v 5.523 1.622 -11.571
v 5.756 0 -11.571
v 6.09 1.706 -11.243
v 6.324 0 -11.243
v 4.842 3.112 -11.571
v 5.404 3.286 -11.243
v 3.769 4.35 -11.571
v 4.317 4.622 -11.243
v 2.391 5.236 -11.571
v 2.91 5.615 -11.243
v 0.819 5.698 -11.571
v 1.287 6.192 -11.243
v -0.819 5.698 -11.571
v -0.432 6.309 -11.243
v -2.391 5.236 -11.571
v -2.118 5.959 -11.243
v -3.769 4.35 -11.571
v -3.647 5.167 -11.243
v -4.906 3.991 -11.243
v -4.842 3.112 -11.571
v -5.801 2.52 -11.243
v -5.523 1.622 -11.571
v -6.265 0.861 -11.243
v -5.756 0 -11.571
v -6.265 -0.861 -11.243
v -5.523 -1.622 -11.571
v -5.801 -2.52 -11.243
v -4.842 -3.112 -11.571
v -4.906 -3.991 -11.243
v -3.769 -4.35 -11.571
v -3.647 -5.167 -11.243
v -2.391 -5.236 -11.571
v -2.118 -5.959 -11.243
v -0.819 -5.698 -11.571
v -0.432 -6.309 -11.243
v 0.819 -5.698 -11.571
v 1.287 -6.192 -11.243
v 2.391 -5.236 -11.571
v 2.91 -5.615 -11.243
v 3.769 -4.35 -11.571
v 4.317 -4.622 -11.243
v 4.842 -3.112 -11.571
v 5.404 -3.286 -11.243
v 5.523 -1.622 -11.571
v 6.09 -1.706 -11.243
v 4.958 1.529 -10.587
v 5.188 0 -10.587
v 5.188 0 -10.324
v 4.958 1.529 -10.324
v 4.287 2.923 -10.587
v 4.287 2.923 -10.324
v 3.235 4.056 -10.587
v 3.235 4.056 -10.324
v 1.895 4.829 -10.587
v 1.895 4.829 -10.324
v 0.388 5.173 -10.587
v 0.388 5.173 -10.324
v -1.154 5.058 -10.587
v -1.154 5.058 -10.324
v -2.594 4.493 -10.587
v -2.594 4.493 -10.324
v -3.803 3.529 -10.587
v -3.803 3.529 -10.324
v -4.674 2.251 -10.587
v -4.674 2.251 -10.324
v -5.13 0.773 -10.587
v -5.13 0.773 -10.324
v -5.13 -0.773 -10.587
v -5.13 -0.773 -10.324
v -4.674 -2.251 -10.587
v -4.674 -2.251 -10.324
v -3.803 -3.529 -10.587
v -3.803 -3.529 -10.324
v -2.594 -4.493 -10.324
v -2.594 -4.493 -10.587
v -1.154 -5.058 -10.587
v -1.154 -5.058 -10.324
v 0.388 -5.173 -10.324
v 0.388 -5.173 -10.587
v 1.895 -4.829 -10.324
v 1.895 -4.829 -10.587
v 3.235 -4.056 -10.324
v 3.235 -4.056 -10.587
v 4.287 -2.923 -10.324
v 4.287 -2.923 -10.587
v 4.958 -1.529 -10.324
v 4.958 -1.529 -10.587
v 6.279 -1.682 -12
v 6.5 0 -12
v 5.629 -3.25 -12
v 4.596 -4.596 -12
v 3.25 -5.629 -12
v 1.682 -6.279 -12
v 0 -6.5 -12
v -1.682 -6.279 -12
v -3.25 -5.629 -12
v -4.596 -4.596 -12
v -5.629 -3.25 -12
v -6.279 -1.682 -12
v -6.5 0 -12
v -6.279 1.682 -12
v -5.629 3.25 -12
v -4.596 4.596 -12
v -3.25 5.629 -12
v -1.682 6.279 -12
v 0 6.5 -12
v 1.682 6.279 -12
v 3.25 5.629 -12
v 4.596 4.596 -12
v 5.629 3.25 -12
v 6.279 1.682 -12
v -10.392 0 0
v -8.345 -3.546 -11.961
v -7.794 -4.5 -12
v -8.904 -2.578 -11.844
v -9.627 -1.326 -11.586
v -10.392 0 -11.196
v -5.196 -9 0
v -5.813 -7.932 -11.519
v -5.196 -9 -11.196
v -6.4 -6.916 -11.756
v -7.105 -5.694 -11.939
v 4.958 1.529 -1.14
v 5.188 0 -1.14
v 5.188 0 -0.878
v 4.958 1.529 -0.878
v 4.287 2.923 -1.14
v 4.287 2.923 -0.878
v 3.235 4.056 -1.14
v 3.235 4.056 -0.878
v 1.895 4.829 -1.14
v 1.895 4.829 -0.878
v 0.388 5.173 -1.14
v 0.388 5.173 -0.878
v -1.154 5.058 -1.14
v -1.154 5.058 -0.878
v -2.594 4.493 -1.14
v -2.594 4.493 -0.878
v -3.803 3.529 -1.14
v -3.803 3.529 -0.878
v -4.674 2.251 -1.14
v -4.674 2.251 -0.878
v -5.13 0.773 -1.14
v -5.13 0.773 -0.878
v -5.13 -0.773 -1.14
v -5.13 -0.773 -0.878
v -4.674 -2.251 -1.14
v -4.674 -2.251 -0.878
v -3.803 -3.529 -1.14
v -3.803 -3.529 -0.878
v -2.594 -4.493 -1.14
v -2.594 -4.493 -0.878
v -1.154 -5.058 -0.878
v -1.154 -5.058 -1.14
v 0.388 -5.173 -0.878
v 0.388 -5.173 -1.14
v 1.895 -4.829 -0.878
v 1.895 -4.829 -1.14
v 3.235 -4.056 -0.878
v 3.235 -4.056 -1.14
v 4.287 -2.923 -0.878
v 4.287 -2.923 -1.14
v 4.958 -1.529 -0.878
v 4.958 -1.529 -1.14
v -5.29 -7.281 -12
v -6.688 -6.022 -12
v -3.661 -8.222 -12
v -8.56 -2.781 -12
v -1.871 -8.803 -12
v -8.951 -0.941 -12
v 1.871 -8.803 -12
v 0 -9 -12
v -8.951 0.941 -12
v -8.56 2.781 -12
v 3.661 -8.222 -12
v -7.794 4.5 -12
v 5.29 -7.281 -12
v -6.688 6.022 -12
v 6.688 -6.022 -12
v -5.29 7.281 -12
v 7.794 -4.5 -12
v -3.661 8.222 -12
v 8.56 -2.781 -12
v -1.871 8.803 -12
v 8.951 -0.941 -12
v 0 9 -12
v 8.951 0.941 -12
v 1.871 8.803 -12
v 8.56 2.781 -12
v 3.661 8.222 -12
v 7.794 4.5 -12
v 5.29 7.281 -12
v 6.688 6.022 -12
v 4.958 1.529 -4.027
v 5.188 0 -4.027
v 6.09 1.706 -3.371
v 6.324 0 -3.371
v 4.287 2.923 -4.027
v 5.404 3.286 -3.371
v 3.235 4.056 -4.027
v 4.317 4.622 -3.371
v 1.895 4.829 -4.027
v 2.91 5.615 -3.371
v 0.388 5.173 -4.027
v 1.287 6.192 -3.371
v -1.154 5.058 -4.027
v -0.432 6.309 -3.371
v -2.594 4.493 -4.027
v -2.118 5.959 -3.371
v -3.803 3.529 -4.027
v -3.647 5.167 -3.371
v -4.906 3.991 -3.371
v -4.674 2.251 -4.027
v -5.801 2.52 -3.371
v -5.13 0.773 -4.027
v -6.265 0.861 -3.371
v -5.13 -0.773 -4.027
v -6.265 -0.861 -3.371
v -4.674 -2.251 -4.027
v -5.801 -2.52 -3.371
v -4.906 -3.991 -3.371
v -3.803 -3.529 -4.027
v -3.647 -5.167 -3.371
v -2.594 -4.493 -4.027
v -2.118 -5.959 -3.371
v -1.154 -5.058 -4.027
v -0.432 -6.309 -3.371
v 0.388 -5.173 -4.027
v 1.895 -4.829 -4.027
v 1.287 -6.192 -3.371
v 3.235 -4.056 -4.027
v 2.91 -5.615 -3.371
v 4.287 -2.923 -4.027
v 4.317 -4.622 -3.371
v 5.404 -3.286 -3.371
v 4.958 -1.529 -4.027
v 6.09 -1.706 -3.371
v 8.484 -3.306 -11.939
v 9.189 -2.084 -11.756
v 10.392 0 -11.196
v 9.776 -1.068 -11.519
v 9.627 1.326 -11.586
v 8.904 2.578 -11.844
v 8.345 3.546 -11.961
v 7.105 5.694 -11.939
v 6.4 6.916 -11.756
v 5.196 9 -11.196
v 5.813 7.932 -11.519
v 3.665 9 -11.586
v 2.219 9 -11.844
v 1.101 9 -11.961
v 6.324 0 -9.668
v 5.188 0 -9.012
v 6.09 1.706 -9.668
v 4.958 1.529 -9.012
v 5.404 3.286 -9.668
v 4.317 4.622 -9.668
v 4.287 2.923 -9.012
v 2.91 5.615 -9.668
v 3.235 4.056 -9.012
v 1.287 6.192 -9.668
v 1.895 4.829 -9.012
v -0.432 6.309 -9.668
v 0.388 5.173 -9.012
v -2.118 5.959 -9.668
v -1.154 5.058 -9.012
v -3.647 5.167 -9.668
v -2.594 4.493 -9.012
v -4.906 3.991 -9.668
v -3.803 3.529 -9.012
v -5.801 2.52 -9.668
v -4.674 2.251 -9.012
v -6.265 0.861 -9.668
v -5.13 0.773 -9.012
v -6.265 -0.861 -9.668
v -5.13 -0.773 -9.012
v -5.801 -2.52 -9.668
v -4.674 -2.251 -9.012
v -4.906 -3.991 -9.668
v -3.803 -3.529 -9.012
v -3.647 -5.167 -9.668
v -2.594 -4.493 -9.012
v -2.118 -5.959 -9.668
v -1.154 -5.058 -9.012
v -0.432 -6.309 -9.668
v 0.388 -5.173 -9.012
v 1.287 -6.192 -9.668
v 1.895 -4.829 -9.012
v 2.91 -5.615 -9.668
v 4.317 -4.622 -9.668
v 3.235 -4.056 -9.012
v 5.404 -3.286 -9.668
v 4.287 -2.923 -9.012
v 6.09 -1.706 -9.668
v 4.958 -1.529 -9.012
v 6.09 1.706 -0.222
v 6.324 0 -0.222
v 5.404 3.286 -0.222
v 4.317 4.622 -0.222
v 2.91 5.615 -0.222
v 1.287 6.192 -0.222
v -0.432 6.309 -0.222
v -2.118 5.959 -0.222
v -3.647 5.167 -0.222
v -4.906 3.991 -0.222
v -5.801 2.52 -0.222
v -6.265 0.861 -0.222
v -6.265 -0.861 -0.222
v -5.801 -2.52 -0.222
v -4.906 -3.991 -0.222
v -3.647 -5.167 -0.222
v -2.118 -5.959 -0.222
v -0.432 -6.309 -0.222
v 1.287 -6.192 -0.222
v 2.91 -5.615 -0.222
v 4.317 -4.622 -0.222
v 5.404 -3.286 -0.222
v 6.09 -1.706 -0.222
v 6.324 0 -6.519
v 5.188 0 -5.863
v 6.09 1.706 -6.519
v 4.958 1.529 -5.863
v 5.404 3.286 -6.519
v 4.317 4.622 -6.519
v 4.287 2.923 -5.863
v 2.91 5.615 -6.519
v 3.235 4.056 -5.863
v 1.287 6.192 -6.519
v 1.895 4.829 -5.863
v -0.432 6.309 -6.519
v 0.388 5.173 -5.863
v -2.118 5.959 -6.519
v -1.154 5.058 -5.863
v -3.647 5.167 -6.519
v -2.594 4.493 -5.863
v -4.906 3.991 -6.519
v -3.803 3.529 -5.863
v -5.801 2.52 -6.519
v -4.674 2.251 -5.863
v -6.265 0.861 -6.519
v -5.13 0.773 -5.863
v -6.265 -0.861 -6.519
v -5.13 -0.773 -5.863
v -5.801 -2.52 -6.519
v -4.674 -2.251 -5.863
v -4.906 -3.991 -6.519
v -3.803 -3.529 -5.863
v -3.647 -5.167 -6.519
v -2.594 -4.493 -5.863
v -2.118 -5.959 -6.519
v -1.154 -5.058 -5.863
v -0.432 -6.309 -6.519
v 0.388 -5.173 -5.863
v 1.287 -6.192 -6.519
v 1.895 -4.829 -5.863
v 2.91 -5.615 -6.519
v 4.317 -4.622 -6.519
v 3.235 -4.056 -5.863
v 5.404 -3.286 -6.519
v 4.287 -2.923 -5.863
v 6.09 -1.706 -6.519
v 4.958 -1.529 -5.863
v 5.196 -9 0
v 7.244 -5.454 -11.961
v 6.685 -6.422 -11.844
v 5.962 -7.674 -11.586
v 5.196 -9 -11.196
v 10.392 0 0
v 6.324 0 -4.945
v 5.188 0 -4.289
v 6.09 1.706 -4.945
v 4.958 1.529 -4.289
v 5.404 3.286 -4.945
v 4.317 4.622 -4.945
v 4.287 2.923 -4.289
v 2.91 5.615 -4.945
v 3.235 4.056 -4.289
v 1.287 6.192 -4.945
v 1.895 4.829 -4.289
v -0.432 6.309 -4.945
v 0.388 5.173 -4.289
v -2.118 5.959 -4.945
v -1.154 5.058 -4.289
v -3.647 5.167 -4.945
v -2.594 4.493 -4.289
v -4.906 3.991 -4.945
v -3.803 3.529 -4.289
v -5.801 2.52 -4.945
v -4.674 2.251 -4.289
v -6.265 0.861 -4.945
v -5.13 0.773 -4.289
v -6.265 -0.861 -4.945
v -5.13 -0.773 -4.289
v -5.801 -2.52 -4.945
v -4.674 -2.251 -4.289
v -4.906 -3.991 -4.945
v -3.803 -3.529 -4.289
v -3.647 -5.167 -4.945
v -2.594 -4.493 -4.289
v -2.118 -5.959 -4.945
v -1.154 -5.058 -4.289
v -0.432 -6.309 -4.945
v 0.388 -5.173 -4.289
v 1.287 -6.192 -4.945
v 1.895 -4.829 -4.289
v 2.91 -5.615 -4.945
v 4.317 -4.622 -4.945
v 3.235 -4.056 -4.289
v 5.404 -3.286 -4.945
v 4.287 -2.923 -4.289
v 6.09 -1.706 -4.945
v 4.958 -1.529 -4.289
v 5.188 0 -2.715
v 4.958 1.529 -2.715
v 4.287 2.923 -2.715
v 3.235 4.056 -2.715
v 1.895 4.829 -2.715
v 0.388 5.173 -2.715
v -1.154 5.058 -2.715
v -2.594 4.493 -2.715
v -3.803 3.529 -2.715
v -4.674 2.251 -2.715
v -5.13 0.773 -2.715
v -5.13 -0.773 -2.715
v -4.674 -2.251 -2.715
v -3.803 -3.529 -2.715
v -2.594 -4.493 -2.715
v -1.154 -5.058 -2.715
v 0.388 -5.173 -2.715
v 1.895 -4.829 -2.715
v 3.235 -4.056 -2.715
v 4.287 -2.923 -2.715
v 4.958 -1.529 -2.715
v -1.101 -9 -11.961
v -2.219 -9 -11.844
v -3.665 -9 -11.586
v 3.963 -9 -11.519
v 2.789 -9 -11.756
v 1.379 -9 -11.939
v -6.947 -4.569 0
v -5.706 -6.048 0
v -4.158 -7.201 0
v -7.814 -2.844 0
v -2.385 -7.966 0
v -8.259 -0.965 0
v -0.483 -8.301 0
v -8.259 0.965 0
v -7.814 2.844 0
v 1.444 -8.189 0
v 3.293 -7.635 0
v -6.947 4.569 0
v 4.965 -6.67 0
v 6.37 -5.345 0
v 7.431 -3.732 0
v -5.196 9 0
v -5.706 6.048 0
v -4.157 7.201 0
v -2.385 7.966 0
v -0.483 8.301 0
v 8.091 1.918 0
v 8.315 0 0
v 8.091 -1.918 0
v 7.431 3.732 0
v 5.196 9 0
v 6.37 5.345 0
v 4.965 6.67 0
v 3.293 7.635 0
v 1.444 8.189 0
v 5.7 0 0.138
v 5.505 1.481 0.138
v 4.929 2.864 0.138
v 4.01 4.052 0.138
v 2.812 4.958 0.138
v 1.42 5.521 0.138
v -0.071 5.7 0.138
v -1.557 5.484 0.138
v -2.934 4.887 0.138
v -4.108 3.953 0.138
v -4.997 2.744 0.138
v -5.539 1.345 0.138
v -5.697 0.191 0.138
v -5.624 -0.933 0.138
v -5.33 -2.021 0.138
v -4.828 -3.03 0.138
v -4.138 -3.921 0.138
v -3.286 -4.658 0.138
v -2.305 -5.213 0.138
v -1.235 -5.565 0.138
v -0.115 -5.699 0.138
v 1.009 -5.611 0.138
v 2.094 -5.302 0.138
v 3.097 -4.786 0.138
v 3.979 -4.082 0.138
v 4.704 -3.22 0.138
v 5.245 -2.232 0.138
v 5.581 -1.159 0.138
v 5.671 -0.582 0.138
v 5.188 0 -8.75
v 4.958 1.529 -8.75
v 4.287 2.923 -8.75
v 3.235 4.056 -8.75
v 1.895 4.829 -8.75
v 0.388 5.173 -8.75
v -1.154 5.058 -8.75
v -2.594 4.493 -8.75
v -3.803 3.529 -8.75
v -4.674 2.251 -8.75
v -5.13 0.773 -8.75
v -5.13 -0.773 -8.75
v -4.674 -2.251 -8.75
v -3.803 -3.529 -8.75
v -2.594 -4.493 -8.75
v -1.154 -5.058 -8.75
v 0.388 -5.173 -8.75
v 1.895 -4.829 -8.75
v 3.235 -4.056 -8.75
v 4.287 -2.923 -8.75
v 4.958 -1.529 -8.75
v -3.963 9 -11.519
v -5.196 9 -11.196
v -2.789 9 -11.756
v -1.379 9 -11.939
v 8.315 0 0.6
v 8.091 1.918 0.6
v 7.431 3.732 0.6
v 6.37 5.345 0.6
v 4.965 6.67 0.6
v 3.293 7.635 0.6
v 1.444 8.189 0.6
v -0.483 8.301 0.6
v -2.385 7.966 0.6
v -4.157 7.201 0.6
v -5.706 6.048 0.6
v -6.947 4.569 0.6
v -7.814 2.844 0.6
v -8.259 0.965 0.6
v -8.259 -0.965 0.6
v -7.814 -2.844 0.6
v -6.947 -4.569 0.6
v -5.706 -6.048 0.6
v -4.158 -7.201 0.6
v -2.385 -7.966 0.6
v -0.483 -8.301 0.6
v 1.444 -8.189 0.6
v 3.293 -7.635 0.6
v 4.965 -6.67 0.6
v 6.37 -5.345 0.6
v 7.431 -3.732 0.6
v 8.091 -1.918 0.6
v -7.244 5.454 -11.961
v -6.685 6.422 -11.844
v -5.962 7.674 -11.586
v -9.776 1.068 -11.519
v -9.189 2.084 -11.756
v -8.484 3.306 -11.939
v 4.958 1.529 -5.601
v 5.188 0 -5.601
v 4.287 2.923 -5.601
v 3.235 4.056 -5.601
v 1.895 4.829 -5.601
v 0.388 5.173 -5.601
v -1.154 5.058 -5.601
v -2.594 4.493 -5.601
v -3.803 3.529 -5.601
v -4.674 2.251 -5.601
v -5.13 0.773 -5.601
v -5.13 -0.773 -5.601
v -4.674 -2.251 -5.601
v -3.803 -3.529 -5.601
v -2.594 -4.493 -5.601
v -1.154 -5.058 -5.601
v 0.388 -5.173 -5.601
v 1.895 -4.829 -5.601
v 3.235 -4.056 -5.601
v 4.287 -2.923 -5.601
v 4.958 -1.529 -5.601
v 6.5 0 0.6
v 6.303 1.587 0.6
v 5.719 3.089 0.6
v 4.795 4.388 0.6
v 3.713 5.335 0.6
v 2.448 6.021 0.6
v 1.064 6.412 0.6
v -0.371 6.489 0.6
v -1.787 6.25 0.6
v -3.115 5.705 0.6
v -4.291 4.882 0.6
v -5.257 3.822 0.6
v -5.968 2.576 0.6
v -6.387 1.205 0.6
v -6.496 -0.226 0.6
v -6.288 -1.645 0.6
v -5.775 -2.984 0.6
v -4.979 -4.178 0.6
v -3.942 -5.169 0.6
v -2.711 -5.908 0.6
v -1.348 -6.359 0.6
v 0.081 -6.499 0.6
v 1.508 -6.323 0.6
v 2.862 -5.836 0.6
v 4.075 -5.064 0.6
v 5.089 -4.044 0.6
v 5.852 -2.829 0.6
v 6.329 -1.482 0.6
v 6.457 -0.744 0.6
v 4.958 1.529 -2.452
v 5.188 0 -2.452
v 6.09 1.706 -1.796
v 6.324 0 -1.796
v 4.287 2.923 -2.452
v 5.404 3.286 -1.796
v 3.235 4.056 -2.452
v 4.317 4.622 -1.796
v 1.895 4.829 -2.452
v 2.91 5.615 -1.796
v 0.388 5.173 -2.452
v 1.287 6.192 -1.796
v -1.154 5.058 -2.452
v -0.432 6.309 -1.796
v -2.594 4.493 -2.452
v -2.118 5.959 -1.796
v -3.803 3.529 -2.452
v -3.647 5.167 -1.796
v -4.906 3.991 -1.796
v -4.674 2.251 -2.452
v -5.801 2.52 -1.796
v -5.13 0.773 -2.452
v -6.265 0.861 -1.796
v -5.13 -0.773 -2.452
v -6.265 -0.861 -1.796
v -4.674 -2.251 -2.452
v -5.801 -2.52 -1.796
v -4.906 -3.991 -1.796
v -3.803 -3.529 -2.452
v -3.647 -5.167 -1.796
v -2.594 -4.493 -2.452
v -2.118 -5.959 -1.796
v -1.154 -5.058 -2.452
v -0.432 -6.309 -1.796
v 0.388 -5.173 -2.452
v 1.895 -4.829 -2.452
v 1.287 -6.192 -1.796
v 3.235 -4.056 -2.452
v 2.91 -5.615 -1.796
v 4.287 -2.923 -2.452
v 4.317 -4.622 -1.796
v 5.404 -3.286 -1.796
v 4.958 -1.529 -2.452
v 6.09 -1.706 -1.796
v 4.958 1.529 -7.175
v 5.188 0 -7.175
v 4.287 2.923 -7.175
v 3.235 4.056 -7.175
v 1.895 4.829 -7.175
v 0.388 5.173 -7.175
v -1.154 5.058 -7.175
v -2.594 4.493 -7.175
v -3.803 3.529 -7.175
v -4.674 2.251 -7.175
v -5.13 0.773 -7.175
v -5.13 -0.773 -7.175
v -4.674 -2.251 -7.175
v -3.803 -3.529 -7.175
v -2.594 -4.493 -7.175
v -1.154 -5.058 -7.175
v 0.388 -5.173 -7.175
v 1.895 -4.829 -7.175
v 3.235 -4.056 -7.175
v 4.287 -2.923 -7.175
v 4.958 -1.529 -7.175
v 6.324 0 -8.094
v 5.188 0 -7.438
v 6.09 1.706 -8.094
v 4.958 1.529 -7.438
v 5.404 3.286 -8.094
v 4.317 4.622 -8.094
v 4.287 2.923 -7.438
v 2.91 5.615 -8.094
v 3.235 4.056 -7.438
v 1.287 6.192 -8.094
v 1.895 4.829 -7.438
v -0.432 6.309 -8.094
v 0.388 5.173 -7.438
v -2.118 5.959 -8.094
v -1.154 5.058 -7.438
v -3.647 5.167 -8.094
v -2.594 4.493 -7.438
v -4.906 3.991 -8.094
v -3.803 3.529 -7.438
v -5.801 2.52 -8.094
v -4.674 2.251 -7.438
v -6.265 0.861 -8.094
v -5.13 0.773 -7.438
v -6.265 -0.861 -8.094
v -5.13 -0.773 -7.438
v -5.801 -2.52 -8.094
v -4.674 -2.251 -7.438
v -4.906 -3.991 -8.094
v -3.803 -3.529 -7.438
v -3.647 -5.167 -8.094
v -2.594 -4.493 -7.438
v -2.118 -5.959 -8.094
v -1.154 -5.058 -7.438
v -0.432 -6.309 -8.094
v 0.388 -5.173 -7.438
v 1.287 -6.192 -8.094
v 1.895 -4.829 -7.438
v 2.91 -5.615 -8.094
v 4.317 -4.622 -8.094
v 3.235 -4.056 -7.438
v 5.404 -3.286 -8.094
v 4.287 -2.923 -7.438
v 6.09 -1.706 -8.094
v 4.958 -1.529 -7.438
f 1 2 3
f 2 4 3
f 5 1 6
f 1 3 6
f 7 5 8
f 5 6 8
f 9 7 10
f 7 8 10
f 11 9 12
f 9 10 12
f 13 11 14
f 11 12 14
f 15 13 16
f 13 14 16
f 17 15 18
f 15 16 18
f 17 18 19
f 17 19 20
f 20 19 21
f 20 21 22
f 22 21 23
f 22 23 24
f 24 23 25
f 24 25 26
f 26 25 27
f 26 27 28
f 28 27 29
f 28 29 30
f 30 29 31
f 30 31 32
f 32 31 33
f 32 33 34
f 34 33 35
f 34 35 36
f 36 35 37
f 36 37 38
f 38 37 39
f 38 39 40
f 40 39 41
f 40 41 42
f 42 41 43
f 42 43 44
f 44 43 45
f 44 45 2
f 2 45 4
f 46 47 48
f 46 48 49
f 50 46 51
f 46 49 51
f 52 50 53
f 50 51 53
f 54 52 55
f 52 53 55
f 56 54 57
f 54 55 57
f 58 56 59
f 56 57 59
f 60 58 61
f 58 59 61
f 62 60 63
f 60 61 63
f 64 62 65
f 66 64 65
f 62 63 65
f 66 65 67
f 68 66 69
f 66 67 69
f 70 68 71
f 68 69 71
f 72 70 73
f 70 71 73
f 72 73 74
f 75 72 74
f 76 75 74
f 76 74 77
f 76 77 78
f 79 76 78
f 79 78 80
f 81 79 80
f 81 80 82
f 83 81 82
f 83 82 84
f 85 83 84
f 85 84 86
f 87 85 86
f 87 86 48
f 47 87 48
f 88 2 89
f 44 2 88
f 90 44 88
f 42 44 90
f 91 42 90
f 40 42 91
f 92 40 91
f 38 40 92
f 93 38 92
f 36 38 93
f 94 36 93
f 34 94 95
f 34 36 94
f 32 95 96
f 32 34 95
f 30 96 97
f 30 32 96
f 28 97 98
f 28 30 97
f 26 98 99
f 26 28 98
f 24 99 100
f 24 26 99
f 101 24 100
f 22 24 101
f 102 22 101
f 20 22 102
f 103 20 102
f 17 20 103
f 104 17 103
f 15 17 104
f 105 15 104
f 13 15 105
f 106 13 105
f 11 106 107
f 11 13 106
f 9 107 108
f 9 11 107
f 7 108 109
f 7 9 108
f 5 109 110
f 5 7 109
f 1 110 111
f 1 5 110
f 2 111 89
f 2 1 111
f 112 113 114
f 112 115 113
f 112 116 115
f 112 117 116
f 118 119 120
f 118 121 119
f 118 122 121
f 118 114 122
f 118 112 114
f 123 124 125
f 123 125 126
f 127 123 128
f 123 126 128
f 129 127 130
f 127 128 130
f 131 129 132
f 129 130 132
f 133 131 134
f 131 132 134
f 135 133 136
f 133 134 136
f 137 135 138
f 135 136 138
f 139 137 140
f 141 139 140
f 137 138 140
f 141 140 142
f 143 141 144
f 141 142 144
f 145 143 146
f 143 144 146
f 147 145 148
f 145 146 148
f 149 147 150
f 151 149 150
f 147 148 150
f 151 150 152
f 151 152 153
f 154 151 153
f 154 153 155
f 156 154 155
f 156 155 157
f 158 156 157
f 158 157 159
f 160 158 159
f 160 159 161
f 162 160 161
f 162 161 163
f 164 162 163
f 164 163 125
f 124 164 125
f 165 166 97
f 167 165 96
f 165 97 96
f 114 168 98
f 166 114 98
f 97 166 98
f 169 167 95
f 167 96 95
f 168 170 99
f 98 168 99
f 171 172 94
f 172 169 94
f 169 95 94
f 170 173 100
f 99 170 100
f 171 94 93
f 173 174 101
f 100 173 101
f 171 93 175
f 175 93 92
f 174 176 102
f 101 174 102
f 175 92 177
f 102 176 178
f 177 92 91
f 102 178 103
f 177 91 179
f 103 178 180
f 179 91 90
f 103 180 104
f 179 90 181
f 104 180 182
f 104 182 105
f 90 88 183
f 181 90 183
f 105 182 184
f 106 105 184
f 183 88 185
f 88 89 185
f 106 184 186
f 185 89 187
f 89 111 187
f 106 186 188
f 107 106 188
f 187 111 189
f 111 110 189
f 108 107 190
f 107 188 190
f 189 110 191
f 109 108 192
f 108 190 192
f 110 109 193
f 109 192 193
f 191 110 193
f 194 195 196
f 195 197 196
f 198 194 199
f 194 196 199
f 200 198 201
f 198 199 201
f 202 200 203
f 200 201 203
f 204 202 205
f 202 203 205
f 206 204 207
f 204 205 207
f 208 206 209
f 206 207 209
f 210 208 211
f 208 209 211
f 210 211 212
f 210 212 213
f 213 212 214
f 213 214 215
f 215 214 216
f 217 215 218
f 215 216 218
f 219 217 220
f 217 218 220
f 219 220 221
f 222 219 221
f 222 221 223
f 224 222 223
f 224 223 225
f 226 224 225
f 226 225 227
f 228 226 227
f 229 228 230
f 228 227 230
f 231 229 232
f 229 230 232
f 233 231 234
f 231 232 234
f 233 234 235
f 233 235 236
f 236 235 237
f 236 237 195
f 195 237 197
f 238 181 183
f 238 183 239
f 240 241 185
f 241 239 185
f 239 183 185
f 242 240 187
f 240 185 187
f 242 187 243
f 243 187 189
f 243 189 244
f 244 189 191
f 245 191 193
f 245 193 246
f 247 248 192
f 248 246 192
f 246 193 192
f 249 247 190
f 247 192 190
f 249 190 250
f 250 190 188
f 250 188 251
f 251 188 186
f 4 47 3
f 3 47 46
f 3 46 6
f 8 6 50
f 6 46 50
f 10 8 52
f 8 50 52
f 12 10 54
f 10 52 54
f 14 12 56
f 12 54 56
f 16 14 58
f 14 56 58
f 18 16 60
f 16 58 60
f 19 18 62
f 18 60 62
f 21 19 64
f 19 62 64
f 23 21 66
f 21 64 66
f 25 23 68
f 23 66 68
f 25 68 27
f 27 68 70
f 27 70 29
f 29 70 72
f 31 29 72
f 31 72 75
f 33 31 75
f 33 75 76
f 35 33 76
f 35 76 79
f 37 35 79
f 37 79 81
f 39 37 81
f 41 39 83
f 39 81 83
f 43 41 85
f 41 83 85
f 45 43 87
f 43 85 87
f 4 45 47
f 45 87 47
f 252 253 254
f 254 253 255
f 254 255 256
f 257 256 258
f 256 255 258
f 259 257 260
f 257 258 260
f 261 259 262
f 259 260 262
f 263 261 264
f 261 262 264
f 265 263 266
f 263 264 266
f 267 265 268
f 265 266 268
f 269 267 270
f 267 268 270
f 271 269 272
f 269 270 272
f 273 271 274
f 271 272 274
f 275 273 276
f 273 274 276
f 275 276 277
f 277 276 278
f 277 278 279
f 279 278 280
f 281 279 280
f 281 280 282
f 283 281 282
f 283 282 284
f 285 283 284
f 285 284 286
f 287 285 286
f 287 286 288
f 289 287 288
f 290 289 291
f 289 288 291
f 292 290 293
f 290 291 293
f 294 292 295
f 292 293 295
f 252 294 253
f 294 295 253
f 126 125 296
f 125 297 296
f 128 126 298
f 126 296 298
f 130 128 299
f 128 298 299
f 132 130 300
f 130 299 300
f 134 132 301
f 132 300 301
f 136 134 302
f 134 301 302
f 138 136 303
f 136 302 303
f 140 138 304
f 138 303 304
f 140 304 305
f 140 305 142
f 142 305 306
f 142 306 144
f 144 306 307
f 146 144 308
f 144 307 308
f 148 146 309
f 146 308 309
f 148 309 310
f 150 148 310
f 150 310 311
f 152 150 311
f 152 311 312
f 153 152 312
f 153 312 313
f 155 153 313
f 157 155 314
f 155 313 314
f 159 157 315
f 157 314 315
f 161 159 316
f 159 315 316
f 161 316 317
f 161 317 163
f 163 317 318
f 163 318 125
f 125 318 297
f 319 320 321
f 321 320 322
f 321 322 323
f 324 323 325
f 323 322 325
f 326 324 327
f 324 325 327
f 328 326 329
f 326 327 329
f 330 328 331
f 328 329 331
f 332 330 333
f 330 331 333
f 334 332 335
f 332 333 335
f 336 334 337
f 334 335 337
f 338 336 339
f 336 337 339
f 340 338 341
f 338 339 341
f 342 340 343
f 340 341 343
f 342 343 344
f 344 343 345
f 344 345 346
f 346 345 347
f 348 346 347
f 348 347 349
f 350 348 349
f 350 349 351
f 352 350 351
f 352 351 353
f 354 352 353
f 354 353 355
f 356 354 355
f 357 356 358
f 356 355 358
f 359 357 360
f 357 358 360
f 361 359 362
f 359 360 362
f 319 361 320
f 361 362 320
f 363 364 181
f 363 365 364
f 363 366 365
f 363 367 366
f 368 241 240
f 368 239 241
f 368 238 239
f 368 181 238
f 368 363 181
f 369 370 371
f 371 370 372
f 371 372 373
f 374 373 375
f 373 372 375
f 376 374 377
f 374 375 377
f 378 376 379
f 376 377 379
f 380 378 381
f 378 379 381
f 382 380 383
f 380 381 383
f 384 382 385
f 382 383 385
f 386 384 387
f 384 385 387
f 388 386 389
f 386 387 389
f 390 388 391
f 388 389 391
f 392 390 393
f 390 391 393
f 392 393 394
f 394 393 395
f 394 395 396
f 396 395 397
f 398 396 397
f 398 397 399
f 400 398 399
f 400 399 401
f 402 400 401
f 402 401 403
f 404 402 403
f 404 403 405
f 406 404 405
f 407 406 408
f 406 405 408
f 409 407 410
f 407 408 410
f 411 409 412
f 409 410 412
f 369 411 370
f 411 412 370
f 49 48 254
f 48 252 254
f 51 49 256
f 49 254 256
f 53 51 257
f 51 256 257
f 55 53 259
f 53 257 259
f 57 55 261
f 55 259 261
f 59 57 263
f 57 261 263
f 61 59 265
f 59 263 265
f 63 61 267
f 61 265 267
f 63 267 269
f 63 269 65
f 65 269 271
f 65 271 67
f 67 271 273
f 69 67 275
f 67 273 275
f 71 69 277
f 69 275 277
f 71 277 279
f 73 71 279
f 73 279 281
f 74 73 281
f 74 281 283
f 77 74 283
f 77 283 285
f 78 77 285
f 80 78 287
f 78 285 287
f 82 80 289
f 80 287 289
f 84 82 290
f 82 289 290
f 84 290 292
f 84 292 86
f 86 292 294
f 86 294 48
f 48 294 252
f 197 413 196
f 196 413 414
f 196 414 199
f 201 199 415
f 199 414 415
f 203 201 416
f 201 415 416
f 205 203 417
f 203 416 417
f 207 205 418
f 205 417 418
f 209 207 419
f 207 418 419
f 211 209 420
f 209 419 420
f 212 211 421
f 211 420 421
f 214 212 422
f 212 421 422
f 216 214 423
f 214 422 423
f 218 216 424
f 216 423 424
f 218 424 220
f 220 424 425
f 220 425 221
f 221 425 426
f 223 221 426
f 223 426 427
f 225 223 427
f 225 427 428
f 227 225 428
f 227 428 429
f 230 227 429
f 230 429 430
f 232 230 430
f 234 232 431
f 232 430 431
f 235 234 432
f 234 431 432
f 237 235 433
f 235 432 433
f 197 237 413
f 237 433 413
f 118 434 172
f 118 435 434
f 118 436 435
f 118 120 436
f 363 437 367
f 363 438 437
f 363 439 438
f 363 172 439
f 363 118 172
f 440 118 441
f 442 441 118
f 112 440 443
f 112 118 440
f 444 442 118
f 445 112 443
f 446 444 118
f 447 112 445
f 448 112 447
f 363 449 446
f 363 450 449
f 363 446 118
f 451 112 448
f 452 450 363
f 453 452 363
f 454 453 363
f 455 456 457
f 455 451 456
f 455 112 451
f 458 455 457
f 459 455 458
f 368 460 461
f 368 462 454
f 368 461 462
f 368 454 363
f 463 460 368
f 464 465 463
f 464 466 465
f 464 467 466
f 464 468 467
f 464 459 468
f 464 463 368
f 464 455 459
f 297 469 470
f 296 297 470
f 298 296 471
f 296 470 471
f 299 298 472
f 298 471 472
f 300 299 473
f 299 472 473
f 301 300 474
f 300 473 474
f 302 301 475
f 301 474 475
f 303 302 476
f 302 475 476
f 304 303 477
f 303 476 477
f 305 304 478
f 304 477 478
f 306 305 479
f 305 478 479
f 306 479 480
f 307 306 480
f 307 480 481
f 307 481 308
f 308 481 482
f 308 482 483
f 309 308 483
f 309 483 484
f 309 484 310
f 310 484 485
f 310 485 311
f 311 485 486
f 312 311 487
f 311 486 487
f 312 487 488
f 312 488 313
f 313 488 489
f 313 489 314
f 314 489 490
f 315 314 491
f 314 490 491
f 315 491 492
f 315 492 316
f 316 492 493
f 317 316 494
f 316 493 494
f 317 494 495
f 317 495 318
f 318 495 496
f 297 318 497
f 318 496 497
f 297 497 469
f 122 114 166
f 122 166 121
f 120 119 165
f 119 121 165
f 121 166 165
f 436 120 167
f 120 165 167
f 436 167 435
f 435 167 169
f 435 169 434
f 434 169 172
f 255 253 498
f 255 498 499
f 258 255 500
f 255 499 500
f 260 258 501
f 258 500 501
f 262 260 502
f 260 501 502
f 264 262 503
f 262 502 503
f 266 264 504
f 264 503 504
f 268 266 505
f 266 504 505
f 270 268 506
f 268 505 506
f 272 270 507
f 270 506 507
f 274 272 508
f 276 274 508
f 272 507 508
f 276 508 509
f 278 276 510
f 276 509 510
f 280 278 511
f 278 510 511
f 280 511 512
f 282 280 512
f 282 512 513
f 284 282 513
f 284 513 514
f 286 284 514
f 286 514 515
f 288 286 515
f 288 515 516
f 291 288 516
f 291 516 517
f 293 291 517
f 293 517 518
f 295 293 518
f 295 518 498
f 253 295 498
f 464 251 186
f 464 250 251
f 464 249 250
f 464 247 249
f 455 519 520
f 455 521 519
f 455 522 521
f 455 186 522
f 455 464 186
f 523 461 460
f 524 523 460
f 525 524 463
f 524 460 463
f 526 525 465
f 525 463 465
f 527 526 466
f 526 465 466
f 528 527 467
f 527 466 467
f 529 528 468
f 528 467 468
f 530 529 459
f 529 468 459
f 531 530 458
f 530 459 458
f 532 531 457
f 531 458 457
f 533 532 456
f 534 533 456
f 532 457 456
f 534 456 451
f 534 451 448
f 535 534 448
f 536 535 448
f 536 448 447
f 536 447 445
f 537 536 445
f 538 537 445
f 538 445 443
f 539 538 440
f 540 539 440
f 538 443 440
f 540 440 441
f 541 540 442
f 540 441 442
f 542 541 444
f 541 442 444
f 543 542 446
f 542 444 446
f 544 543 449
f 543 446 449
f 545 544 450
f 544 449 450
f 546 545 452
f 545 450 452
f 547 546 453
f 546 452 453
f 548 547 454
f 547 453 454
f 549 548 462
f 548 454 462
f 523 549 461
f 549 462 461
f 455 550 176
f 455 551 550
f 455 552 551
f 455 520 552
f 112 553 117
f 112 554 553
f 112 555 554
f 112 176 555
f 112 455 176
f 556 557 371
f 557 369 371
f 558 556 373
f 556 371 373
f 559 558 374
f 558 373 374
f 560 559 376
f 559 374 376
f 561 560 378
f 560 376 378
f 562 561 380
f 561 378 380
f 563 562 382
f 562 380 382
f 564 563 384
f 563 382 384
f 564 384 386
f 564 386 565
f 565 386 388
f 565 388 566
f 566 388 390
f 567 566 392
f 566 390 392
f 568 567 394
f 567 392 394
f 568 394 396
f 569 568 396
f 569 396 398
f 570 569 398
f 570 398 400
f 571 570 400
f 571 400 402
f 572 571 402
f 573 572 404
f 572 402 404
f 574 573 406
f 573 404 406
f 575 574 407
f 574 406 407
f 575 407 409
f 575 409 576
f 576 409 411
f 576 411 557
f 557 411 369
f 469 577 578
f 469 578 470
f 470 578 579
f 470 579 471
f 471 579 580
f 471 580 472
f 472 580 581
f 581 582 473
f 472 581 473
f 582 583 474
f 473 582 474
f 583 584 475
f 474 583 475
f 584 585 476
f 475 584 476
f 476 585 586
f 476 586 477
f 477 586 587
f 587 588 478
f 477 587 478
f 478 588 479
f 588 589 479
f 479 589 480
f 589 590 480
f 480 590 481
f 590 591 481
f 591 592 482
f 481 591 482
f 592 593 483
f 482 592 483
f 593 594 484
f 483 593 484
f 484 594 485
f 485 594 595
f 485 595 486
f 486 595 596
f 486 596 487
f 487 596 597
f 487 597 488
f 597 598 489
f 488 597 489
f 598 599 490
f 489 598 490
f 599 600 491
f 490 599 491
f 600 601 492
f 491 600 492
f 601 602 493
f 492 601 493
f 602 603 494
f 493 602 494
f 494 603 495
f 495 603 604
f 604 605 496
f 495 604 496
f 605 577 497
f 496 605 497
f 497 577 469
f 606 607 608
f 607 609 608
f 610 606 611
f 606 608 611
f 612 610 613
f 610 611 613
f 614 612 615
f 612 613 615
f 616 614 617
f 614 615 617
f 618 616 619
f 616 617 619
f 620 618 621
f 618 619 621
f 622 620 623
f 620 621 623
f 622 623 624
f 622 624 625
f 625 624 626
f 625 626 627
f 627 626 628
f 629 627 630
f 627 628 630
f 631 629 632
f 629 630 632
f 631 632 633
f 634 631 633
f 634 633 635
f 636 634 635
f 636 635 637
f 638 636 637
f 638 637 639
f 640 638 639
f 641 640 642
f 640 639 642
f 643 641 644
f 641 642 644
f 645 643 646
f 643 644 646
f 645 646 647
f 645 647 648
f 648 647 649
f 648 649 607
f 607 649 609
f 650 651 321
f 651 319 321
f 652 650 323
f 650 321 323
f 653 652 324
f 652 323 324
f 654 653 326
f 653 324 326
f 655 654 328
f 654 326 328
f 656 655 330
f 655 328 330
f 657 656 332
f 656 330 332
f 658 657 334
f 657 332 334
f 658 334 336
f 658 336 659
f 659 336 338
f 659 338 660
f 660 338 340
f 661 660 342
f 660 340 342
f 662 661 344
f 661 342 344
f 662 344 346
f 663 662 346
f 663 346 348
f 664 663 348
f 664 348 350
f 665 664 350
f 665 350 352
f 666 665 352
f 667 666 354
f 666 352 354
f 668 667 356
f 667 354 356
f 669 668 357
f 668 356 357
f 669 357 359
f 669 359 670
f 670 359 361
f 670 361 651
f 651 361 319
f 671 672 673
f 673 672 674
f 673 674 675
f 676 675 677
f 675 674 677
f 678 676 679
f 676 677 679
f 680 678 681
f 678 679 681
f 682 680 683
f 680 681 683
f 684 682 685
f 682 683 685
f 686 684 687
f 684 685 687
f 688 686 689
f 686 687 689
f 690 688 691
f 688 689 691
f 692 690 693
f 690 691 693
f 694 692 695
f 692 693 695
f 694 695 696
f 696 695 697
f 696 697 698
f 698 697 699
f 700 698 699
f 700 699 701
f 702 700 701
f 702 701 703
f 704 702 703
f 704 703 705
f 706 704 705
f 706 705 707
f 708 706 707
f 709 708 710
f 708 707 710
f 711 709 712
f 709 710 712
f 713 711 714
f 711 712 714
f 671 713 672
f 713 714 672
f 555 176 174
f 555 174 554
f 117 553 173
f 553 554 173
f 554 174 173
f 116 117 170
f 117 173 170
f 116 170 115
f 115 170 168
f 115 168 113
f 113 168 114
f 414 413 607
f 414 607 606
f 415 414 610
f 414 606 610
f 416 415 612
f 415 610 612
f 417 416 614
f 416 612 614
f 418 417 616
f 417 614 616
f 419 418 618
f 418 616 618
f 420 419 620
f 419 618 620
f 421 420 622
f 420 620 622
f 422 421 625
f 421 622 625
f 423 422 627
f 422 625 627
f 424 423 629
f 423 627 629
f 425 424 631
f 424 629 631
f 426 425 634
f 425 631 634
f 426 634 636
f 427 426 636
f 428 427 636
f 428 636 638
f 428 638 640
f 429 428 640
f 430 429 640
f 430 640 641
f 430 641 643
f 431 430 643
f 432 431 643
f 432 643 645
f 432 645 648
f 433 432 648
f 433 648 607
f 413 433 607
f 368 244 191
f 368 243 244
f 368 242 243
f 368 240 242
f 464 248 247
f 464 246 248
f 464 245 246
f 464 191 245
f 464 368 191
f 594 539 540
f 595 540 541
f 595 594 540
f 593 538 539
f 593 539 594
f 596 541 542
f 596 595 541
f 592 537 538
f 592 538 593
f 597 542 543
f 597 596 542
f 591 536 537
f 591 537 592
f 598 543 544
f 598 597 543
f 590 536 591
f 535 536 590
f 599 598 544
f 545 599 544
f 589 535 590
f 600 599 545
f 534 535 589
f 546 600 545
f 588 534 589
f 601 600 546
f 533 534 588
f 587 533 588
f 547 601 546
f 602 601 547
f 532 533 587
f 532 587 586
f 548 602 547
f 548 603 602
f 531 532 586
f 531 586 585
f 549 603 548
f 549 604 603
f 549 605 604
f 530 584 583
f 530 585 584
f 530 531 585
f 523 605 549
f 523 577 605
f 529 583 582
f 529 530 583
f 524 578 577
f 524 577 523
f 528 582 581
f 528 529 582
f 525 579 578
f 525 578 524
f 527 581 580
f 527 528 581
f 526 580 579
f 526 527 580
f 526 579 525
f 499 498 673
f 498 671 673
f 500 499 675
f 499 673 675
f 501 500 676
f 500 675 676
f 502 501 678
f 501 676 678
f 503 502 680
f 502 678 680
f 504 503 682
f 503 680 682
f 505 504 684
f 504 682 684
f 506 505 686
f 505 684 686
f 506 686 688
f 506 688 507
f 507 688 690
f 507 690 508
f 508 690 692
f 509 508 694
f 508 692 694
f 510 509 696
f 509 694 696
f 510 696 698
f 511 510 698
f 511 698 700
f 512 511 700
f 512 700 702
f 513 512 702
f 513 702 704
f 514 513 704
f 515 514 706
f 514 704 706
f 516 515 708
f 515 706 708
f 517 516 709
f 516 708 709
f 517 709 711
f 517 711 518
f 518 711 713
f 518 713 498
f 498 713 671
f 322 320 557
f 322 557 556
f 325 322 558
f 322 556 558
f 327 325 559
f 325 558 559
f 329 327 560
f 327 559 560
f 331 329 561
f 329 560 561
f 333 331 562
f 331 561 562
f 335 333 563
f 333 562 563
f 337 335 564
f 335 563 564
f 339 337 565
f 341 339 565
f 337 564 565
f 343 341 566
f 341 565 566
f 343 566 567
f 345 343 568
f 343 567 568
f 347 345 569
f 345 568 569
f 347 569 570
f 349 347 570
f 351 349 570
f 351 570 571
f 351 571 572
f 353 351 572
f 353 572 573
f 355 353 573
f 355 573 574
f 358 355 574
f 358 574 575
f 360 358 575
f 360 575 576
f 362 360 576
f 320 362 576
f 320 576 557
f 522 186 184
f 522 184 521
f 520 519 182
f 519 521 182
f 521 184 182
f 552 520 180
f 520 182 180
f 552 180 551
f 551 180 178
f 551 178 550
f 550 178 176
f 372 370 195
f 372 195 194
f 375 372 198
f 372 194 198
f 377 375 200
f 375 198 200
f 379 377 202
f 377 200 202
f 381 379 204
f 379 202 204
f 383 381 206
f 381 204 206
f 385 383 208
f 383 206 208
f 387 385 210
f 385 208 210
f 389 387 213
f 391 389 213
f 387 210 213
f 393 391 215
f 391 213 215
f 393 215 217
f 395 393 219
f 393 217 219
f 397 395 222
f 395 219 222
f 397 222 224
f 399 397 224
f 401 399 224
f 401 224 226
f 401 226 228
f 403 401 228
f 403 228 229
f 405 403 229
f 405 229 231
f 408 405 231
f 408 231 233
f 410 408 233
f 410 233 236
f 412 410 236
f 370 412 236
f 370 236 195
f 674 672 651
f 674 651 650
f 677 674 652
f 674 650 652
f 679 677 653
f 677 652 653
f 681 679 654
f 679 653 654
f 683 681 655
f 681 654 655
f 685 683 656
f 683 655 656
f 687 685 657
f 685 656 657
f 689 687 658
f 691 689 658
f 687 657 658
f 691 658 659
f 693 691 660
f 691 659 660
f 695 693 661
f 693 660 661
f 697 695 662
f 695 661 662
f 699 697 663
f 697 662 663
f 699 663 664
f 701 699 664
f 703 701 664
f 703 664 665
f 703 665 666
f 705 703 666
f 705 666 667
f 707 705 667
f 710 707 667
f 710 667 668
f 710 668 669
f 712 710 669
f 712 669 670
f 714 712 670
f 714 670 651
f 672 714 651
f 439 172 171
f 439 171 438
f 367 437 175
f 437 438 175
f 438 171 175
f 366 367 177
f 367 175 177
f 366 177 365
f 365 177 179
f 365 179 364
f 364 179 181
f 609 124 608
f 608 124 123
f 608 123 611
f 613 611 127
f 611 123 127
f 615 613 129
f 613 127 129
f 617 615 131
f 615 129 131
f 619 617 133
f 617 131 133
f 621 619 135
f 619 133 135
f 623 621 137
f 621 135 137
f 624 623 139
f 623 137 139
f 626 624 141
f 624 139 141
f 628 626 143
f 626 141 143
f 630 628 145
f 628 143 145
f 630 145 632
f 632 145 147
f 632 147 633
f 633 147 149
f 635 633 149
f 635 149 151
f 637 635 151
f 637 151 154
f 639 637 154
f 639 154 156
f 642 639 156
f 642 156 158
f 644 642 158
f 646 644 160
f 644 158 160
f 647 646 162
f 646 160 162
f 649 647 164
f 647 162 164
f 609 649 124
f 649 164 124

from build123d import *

# Parameters (mm, degrees)
SKETCH1_R         = 5.188
BASENUT_DEPTH     = 12
SKETCH3_R         = 8.315
SKETCH3_R_2       = 5.188
EXTRUDE1_DEPTH    = 0.6
ENDCHAMFER3_SIZE  = 1.312
ENDCHAMFER3_SIZE2 = 0.757483553
LPATTERN10_COUNT  = 8
LPATTERN10_PITCH  = 1.5744


with BuildPart() as part:
    # Sketch1 → BaseNut (new body)
    with BuildSketch(Plane.XY):
        Polygon((5.196152423, -9), (10.392304845, 0), (5.196152423, 9), (-5.196152423, 9), (-10.392304845, 0), (-5.196152423, -9), align=None)
        Circle(SKETCH1_R, mode=Mode.SUBTRACT)
    extrude(amount=-BASENUT_DEPTH)

    # Sketch2 → Chamfer1 (revolve, cut)
    with BuildSketch(Plane(origin=(-16.706149795, 0, -15.04811501), x_dir=(0, 0, 1), z_dir=(0, 1, 0))):
        Polygon((3.04811501, 25.706149795), (3.04811501, 27.098454641), (3.851962587, 27.098454641), align=None)
    revolve(axis=Axis((0, 0, -38.770766557), (0, 0, 1)), mode=Mode.SUBTRACT)

    # Sketch6 → EndChamfer1 (revolve, cut)
    with BuildSketch(Plane(origin=(-9.197458863, 0, -10.252541137), x_dir=(0, 0, 1), z_dir=(0, 1, 0))):
        Polygon((-1.747458863, 14.385458863), (-1.747458863, 15.697458863), (-0.989975309, 14.385458863), align=None)
    revolve(axis=Axis((0, 0, 13.104863586), (0, 0, -1)), mode=Mode.SUBTRACT)

    # Sketch3 → Extrude1 (add)
    with BuildSketch(Plane(origin=(-18.48918612, 11.17895969, 0), x_dir=(1, 0, 0), z_dir=(0, 0, 1))):
        with Locations((18.48918612, -11.17895969)):
            Circle(SKETCH3_R)
        with Locations((18.48918612, -11.17895969)):
            Circle(SKETCH3_R_2, mode=Mode.SUBTRACT)
    extrude(amount=EXTRUDE1_DEPTH)

    # EndChamfer3
    endchamfer3_edges = [part.edges().sort_by_distance(p)[0] for p in [
        (-5.188, 0, 0.6),
    ]]
    endchamfer3_side = [part.faces().sort_by_distance(p)[0] for p in [
        (-8.079816285, 0, 0.6),
    ]]
    chamfer(endchamfer3_edges, length=ENDCHAMFER3_SIZE, length2=ENDCHAMFER3_SIZE2, reference=endchamfer3_side[0])

    # Sketch7 → Cut-Revolve10 (revolve, cut)
    with BuildSketch(Plane(origin=(0, 0, 0), x_dir=(1, 0, 0), z_dir=(0, 1, 0))):
        Polygon((3.876, 11.898516447), (5.188, 11.898516447), (6.32422533, 11.242516447), (5.188, 10.586516447), (3.876, 10.586516447), align=None)
    cut_revolve10 = revolve(axis=Axis((0, 0, -61.609777784), (0, 0, 1)), mode=Mode.SUBTRACT)

    # LPattern10: Cut-Revolve10 ×8
    with Locations(*[(0, 0, i * LPATTERN10_PITCH) for i in range(1, LPATTERN10_COUNT)]):
        add(cut_revolve10, mode=Mode.SUBTRACT)


solid = part.part
